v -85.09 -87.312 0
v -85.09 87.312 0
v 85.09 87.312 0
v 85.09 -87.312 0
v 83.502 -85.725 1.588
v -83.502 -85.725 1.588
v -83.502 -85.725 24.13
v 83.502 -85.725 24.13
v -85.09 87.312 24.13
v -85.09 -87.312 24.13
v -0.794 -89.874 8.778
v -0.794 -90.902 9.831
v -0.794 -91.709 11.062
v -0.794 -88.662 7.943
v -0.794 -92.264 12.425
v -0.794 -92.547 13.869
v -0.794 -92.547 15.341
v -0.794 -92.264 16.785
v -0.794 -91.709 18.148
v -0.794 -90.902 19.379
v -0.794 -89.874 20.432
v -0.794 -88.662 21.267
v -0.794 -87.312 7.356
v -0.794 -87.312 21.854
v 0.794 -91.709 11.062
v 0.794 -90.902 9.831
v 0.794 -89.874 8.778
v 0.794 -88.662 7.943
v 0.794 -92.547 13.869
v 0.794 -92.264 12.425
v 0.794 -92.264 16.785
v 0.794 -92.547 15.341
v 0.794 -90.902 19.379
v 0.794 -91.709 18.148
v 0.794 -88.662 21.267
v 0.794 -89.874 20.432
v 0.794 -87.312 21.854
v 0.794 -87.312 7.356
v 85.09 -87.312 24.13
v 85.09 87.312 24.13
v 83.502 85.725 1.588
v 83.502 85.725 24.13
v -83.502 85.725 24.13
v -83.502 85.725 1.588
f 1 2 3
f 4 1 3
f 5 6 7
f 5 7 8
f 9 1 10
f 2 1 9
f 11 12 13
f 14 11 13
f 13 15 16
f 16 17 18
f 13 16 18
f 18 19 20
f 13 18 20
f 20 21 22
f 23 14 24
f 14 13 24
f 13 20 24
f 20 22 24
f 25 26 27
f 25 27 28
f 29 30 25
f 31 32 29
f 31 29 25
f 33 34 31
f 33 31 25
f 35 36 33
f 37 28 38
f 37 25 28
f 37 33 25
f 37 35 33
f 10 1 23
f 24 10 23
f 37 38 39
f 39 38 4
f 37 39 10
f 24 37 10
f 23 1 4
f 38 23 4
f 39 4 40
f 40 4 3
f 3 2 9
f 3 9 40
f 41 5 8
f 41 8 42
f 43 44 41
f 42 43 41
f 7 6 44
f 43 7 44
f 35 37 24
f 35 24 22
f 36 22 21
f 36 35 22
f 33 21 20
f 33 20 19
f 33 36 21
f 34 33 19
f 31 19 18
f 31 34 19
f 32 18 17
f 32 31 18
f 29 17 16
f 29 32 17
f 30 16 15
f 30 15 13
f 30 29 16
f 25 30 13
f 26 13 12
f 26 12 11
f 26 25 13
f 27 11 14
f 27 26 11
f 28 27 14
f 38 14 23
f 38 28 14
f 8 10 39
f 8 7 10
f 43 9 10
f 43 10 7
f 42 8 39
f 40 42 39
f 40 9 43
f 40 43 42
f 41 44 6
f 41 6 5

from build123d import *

# Parameters (mm, degrees)
F0_W     = 170.18
F0_H     = 174.625
F1_DEPTH = 1.5875
F2_W     = 170.18
F2_H     = 174.625
F2_W_2   = 167.005
F2_H_2   = 171.45
F3_DEPTH = 22.5425
F5_DEPTH = 0.79375


with BuildPart() as f1:
    # F0 (on Top) → F1 (new body)
    with BuildSketch(Plane.XY):
        Rectangle(F0_W, F0_H)
    extrude(amount=F1_DEPTH)

    # F2 (on face) → F3 (join)
    with BuildSketch(Plane.XY.offset(1.5875)):
        Rectangle(F2_W, F2_H)
        Rectangle(F2_W_2, F2_H_2, mode=Mode.SUBTRACT)
    extrude(amount=F3_DEPTH)

    # F4 (on Right) → F5 (join, symmetric)
    with BuildSketch(Plane.YZ):
        with BuildLine():
            Line((-87.3125, 7.356259), (-87.3125, 21.853741))
            ThreePointArc((-87.3125, 21.853741), (-92.583, 14.605), (-87.3125, 7.356259))
        make_face()
    extrude(amount=F5_DEPTH, both=True)


solid = f1.part
